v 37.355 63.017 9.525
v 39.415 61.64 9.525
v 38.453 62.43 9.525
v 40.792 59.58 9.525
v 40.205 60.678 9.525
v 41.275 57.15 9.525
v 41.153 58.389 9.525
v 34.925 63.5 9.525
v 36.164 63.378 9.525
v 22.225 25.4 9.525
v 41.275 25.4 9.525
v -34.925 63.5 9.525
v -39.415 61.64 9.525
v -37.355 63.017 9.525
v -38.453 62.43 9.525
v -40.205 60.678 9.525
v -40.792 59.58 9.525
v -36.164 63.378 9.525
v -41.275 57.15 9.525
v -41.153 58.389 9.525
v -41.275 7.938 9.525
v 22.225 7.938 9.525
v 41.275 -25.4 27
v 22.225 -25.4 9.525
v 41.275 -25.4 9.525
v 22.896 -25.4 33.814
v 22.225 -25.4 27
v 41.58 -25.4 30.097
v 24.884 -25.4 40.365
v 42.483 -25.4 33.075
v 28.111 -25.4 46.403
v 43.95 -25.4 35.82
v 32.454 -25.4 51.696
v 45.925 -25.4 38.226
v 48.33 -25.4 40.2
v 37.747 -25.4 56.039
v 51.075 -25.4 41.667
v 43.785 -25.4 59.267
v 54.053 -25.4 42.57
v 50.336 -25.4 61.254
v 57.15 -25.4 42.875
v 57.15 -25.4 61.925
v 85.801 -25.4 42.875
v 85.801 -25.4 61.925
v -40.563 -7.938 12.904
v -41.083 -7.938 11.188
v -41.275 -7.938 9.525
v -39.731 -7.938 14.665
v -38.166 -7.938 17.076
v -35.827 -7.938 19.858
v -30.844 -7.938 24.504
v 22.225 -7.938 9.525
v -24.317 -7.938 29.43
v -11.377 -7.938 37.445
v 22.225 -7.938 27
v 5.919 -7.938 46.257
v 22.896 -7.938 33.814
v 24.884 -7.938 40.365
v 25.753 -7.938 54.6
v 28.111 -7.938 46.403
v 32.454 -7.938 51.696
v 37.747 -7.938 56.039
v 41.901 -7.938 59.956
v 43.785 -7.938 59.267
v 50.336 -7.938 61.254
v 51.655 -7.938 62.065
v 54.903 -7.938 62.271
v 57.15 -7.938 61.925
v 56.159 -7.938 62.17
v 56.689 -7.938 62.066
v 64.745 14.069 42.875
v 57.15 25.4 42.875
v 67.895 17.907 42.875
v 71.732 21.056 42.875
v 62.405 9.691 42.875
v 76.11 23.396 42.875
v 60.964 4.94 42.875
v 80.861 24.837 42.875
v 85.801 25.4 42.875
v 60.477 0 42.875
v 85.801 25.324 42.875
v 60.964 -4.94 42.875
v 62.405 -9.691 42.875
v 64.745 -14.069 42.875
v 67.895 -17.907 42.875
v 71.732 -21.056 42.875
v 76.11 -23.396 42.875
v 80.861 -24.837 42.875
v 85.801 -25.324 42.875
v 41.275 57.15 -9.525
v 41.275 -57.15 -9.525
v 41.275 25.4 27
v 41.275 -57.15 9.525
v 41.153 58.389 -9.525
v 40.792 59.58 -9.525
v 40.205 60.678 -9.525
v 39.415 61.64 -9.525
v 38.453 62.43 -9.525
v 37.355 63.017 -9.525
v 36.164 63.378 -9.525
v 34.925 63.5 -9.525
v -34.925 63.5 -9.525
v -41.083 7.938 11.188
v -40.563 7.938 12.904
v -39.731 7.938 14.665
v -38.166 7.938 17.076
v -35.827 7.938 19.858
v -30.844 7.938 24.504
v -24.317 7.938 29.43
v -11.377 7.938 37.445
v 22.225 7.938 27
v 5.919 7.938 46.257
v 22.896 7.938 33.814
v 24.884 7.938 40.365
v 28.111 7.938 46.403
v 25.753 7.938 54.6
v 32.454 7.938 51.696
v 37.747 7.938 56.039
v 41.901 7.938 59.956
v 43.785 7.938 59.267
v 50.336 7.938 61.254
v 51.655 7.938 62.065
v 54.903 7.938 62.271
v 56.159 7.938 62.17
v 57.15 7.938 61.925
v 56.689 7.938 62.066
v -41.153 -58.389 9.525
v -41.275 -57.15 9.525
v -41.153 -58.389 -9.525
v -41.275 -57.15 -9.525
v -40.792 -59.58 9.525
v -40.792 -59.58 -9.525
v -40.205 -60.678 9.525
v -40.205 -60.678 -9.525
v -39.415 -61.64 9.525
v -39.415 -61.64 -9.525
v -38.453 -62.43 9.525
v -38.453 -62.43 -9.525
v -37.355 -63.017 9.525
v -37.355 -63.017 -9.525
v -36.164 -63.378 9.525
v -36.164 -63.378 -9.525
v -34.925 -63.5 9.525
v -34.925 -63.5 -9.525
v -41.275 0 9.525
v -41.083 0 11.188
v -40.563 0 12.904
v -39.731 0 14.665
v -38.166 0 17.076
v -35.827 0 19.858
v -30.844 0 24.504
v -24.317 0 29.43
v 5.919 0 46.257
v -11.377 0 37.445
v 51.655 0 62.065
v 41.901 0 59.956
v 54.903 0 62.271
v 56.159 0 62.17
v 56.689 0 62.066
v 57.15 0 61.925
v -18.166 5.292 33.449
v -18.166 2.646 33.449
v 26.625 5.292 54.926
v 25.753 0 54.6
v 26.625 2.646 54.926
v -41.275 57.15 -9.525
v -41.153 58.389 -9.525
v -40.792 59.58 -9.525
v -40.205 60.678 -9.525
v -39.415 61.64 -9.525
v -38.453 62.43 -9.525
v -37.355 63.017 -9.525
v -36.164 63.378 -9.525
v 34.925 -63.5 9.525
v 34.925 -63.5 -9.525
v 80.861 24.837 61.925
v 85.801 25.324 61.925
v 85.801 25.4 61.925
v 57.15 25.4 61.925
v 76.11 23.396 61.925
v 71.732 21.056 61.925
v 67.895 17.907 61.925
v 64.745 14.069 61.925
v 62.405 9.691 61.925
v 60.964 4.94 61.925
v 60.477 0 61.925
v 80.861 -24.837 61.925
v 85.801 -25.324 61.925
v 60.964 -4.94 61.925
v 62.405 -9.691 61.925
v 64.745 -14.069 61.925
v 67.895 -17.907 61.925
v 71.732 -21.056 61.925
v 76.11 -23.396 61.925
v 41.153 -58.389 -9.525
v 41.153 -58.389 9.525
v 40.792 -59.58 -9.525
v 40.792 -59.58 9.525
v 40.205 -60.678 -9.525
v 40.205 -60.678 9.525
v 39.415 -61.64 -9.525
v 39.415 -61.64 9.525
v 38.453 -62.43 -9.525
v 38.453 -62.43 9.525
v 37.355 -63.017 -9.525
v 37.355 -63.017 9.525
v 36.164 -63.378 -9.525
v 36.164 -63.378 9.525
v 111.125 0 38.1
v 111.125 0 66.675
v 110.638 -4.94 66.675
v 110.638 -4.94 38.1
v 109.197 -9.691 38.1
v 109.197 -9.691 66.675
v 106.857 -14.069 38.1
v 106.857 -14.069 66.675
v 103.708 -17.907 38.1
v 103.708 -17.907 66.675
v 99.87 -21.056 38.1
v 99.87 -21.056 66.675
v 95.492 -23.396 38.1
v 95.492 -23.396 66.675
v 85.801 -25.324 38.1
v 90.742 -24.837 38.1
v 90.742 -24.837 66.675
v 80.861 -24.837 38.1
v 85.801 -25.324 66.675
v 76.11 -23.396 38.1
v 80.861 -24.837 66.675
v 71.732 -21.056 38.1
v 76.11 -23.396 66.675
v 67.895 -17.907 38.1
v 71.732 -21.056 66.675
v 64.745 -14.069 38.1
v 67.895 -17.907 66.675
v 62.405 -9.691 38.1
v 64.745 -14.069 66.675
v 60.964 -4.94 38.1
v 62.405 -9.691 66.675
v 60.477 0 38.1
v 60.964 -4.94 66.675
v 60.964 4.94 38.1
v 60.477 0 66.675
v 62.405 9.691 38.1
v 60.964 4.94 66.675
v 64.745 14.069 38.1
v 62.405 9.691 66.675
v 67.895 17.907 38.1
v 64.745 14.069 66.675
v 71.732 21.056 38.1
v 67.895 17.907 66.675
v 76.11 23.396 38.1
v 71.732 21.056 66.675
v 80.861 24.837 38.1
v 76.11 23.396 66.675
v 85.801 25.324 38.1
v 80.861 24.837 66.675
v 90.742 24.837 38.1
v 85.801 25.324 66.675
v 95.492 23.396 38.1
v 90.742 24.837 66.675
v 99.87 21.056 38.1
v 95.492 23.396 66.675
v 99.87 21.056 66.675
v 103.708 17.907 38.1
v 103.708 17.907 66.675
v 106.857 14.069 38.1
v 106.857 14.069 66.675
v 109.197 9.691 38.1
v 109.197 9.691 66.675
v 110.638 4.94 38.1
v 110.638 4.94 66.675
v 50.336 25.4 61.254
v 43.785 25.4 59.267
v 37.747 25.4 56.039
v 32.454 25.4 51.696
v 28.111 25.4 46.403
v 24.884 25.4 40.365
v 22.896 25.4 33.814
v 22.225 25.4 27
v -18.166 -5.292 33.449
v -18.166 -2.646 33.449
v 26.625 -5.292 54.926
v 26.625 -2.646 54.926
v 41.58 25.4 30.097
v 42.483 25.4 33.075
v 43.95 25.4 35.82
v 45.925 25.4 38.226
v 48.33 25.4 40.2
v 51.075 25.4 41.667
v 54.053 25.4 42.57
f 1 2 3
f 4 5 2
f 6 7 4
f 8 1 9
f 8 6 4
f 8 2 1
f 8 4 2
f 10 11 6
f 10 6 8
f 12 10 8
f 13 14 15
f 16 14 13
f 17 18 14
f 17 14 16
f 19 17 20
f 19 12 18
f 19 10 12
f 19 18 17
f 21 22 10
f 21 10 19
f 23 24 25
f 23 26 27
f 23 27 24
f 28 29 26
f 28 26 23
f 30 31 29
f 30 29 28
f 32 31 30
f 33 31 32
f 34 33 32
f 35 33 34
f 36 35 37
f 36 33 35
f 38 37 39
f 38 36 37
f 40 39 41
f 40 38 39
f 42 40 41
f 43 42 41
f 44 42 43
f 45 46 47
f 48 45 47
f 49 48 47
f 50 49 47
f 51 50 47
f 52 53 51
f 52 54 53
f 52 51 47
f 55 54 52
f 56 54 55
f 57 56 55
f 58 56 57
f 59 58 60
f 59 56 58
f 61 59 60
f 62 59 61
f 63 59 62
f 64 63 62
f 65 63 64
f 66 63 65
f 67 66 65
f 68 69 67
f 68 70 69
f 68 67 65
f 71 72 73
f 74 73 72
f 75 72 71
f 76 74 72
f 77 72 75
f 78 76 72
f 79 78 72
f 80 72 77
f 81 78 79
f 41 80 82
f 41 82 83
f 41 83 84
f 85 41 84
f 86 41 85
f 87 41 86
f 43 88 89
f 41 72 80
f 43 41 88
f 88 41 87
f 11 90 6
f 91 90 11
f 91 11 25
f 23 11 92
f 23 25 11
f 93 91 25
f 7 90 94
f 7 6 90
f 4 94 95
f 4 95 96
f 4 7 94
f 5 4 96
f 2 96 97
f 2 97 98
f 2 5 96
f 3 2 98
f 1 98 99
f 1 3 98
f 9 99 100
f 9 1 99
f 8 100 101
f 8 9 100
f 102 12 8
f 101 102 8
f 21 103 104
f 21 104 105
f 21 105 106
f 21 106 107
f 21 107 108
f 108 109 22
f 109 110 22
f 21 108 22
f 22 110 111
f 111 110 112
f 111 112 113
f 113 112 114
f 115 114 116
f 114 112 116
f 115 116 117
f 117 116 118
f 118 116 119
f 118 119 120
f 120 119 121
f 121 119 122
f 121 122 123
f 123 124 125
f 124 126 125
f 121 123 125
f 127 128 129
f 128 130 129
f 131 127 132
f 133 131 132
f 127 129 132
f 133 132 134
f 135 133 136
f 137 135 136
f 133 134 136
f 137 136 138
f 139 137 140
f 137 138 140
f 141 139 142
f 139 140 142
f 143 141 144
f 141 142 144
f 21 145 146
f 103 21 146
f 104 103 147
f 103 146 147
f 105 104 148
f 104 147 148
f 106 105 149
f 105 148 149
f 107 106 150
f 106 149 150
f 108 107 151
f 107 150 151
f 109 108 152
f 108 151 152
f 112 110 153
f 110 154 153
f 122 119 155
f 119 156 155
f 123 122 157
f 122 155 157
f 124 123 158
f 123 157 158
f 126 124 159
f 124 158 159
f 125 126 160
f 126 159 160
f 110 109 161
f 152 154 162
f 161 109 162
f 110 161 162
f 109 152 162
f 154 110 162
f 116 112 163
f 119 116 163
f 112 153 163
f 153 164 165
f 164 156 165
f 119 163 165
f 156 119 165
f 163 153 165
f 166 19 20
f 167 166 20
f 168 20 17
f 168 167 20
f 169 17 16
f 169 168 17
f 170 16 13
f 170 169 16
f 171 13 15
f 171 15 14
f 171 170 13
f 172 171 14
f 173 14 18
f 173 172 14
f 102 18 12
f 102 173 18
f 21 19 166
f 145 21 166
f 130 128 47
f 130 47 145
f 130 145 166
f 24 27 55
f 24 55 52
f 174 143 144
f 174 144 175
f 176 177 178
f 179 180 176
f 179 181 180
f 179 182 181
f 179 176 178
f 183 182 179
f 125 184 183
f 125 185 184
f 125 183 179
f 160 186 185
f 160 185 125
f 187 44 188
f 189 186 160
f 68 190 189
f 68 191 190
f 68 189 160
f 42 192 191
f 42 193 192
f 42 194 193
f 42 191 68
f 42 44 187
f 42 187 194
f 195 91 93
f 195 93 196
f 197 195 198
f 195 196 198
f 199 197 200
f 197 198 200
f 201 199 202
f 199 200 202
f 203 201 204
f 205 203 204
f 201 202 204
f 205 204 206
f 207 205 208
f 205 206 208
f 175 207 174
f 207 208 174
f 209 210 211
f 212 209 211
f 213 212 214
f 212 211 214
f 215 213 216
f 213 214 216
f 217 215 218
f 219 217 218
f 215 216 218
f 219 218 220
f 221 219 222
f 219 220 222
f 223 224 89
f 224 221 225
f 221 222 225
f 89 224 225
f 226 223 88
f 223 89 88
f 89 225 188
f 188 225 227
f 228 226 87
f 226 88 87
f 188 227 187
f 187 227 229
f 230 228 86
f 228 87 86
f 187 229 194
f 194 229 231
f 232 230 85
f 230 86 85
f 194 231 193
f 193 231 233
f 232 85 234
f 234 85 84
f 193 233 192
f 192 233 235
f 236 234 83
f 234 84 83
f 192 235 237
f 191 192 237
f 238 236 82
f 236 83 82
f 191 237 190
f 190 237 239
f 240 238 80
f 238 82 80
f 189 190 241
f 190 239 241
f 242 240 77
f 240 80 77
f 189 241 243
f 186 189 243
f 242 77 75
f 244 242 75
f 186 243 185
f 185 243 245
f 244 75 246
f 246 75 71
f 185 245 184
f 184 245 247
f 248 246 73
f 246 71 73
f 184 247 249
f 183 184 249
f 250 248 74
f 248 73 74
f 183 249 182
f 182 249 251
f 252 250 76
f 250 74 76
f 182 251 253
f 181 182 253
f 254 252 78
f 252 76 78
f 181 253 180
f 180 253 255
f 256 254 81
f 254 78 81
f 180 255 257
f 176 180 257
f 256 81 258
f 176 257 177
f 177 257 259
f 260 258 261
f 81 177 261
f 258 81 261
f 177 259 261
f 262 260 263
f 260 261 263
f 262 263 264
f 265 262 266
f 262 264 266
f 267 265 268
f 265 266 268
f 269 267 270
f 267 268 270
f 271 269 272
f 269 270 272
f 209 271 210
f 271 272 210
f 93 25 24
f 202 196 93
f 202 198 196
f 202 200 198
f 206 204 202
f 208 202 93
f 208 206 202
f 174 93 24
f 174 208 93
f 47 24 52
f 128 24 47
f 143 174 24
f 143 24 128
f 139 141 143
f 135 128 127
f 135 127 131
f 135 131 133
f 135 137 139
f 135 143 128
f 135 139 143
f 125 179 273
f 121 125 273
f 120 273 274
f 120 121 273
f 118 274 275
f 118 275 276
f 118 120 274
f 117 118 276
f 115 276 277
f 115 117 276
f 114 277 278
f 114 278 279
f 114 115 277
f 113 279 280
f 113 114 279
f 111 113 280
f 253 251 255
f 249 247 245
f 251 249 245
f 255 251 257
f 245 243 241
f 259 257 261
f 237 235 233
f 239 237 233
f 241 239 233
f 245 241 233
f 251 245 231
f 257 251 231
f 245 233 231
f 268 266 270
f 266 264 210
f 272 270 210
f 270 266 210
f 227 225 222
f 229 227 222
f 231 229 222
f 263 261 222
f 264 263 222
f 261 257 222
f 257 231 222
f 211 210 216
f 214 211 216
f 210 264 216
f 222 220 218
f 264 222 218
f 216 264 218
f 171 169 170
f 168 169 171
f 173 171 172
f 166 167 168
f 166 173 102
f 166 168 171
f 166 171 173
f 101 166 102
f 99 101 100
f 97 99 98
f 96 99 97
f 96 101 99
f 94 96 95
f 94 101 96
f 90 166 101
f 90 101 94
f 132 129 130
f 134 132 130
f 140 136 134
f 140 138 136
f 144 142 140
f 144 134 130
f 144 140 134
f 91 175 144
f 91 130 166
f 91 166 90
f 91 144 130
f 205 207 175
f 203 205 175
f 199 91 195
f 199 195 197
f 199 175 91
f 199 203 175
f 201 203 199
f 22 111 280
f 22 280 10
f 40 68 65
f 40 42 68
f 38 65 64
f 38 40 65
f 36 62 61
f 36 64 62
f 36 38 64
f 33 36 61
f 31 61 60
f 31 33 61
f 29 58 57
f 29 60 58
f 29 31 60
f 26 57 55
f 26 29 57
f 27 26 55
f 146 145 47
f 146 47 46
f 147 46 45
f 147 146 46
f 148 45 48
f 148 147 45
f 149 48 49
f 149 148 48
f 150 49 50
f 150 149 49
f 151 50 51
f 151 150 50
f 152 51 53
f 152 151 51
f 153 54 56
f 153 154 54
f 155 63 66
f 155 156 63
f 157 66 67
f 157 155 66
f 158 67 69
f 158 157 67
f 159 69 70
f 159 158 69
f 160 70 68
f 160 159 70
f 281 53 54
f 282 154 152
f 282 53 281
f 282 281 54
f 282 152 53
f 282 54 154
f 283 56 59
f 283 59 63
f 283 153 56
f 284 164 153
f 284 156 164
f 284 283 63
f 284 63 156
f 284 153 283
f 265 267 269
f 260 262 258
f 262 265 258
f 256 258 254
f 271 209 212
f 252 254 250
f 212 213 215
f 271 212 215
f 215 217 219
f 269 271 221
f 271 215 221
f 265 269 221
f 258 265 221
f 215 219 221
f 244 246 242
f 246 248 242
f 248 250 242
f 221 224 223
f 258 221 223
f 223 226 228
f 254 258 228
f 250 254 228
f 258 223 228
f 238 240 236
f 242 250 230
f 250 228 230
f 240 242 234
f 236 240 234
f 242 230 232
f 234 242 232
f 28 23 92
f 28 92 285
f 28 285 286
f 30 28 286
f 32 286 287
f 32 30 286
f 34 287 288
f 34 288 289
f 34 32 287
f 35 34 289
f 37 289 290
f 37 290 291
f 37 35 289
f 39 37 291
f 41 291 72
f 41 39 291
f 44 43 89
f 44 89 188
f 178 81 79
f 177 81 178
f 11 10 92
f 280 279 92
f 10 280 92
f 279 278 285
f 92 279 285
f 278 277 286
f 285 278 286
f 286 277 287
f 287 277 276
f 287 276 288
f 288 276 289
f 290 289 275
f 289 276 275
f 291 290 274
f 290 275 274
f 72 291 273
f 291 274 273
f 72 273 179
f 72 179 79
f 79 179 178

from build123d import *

# Parameters (mm, degrees)
F0_W     = 25.4762
F0_H     = 19.05
F1_DEPTH = 25.4
F2_DEPTH = 63.5
F3_DEPTH = 7.9375
F5_R     = 6.35


# Not quite as in the source:
# - a feature names something its author has since deleted; it is built from what else it names


with BuildPart() as f1:
    # F0 (on Front) → F1 (new body, symmetric)
    with BuildSketch(Plane.XZ):
        with BuildLine():
            Line((22.225, 9.525), (41.275, 9.525))
            Line((41.275, 9.525), (41.275, 27.0002))
            ThreePointArc((41.275, 27.0002), (45.9246798487, 38.2255201513), (57.15, 42.8752))
            Line((57.15, 42.8752), (60.325, 42.8752))
            Line((60.325, 42.8752), (60.325, 61.9252))
            Line((60.325, 61.9252), (57.15, 61.9252))
            ThreePointArc((57.15, 61.9252), (32.4542956671, 51.6959043329), (22.225, 27.0002))
            Line((22.225, 27.0002), (22.225, 9.525))
        make_face()
        with Locations((73.0631, 52.4002)):
            Rectangle(F0_W, F0_H)
    extrude(amount=F1_DEPTH, both=True)

    # F0 (on Front) → F2 (join, symmetric)
    with BuildSketch(Plane.XZ):
        Polygon((41.275, -9.525), (41.275, 9.525), (22.225, 9.525), (-41.275, 9.525), (-41.275, -9.525), align=None)
    extrude(amount=F2_DEPTH, both=True)

    # F0 (on Front) → F3 (join, symmetric)
    with BuildSketch(Plane.XZ):
        with BuildLine():
            Line((-41.275, 9.525), (22.225, 9.525))
            Line((22.225, 9.525), (22.225, 27.0002))
            ThreePointArc((22.225, 27.0002), (32.4542956671, 51.6959043329), (57.15, 61.9252))
            add(Edge.make_bspline(
                [(-41.275, 9.525), (-40.9908369184, 30.6630749255), (45.7423105836, 66.1747902632), (57.15, 61.9252)],
                knots=[0, 0, 0, 0, 111.5045361635, 111.5045361635, 111.5045361635, 111.5045361635], degree=3))
        make_face()
    extrude(amount=F3_DEPTH, both=True)

    # F0 (on Front) → F4 (revolve)
    with BuildSketch(Plane.XZ):
        Polygon((85.8012, 61.9252), (85.8012, 42.8752), (85.8012, 38.1), (111.125, 38.1), (111.125, 66.675), (85.8012, 66.675), align=None)
    revolve(axis=Axis((85.8012, 0, 52.3875), (0, 0, -1)))

    # F5
    f5_edges = [f1.edges().sort_by_distance(p)[0] for p in [
        (41.275, -63.5, 0),
        (-41.275, -63.5, 0),
        (41.275, 63.5, 0),
        (-41.275, 63.5, 0),
    ]]
    fillet(f5_edges, radius=F5_R)


solid = f1.part
